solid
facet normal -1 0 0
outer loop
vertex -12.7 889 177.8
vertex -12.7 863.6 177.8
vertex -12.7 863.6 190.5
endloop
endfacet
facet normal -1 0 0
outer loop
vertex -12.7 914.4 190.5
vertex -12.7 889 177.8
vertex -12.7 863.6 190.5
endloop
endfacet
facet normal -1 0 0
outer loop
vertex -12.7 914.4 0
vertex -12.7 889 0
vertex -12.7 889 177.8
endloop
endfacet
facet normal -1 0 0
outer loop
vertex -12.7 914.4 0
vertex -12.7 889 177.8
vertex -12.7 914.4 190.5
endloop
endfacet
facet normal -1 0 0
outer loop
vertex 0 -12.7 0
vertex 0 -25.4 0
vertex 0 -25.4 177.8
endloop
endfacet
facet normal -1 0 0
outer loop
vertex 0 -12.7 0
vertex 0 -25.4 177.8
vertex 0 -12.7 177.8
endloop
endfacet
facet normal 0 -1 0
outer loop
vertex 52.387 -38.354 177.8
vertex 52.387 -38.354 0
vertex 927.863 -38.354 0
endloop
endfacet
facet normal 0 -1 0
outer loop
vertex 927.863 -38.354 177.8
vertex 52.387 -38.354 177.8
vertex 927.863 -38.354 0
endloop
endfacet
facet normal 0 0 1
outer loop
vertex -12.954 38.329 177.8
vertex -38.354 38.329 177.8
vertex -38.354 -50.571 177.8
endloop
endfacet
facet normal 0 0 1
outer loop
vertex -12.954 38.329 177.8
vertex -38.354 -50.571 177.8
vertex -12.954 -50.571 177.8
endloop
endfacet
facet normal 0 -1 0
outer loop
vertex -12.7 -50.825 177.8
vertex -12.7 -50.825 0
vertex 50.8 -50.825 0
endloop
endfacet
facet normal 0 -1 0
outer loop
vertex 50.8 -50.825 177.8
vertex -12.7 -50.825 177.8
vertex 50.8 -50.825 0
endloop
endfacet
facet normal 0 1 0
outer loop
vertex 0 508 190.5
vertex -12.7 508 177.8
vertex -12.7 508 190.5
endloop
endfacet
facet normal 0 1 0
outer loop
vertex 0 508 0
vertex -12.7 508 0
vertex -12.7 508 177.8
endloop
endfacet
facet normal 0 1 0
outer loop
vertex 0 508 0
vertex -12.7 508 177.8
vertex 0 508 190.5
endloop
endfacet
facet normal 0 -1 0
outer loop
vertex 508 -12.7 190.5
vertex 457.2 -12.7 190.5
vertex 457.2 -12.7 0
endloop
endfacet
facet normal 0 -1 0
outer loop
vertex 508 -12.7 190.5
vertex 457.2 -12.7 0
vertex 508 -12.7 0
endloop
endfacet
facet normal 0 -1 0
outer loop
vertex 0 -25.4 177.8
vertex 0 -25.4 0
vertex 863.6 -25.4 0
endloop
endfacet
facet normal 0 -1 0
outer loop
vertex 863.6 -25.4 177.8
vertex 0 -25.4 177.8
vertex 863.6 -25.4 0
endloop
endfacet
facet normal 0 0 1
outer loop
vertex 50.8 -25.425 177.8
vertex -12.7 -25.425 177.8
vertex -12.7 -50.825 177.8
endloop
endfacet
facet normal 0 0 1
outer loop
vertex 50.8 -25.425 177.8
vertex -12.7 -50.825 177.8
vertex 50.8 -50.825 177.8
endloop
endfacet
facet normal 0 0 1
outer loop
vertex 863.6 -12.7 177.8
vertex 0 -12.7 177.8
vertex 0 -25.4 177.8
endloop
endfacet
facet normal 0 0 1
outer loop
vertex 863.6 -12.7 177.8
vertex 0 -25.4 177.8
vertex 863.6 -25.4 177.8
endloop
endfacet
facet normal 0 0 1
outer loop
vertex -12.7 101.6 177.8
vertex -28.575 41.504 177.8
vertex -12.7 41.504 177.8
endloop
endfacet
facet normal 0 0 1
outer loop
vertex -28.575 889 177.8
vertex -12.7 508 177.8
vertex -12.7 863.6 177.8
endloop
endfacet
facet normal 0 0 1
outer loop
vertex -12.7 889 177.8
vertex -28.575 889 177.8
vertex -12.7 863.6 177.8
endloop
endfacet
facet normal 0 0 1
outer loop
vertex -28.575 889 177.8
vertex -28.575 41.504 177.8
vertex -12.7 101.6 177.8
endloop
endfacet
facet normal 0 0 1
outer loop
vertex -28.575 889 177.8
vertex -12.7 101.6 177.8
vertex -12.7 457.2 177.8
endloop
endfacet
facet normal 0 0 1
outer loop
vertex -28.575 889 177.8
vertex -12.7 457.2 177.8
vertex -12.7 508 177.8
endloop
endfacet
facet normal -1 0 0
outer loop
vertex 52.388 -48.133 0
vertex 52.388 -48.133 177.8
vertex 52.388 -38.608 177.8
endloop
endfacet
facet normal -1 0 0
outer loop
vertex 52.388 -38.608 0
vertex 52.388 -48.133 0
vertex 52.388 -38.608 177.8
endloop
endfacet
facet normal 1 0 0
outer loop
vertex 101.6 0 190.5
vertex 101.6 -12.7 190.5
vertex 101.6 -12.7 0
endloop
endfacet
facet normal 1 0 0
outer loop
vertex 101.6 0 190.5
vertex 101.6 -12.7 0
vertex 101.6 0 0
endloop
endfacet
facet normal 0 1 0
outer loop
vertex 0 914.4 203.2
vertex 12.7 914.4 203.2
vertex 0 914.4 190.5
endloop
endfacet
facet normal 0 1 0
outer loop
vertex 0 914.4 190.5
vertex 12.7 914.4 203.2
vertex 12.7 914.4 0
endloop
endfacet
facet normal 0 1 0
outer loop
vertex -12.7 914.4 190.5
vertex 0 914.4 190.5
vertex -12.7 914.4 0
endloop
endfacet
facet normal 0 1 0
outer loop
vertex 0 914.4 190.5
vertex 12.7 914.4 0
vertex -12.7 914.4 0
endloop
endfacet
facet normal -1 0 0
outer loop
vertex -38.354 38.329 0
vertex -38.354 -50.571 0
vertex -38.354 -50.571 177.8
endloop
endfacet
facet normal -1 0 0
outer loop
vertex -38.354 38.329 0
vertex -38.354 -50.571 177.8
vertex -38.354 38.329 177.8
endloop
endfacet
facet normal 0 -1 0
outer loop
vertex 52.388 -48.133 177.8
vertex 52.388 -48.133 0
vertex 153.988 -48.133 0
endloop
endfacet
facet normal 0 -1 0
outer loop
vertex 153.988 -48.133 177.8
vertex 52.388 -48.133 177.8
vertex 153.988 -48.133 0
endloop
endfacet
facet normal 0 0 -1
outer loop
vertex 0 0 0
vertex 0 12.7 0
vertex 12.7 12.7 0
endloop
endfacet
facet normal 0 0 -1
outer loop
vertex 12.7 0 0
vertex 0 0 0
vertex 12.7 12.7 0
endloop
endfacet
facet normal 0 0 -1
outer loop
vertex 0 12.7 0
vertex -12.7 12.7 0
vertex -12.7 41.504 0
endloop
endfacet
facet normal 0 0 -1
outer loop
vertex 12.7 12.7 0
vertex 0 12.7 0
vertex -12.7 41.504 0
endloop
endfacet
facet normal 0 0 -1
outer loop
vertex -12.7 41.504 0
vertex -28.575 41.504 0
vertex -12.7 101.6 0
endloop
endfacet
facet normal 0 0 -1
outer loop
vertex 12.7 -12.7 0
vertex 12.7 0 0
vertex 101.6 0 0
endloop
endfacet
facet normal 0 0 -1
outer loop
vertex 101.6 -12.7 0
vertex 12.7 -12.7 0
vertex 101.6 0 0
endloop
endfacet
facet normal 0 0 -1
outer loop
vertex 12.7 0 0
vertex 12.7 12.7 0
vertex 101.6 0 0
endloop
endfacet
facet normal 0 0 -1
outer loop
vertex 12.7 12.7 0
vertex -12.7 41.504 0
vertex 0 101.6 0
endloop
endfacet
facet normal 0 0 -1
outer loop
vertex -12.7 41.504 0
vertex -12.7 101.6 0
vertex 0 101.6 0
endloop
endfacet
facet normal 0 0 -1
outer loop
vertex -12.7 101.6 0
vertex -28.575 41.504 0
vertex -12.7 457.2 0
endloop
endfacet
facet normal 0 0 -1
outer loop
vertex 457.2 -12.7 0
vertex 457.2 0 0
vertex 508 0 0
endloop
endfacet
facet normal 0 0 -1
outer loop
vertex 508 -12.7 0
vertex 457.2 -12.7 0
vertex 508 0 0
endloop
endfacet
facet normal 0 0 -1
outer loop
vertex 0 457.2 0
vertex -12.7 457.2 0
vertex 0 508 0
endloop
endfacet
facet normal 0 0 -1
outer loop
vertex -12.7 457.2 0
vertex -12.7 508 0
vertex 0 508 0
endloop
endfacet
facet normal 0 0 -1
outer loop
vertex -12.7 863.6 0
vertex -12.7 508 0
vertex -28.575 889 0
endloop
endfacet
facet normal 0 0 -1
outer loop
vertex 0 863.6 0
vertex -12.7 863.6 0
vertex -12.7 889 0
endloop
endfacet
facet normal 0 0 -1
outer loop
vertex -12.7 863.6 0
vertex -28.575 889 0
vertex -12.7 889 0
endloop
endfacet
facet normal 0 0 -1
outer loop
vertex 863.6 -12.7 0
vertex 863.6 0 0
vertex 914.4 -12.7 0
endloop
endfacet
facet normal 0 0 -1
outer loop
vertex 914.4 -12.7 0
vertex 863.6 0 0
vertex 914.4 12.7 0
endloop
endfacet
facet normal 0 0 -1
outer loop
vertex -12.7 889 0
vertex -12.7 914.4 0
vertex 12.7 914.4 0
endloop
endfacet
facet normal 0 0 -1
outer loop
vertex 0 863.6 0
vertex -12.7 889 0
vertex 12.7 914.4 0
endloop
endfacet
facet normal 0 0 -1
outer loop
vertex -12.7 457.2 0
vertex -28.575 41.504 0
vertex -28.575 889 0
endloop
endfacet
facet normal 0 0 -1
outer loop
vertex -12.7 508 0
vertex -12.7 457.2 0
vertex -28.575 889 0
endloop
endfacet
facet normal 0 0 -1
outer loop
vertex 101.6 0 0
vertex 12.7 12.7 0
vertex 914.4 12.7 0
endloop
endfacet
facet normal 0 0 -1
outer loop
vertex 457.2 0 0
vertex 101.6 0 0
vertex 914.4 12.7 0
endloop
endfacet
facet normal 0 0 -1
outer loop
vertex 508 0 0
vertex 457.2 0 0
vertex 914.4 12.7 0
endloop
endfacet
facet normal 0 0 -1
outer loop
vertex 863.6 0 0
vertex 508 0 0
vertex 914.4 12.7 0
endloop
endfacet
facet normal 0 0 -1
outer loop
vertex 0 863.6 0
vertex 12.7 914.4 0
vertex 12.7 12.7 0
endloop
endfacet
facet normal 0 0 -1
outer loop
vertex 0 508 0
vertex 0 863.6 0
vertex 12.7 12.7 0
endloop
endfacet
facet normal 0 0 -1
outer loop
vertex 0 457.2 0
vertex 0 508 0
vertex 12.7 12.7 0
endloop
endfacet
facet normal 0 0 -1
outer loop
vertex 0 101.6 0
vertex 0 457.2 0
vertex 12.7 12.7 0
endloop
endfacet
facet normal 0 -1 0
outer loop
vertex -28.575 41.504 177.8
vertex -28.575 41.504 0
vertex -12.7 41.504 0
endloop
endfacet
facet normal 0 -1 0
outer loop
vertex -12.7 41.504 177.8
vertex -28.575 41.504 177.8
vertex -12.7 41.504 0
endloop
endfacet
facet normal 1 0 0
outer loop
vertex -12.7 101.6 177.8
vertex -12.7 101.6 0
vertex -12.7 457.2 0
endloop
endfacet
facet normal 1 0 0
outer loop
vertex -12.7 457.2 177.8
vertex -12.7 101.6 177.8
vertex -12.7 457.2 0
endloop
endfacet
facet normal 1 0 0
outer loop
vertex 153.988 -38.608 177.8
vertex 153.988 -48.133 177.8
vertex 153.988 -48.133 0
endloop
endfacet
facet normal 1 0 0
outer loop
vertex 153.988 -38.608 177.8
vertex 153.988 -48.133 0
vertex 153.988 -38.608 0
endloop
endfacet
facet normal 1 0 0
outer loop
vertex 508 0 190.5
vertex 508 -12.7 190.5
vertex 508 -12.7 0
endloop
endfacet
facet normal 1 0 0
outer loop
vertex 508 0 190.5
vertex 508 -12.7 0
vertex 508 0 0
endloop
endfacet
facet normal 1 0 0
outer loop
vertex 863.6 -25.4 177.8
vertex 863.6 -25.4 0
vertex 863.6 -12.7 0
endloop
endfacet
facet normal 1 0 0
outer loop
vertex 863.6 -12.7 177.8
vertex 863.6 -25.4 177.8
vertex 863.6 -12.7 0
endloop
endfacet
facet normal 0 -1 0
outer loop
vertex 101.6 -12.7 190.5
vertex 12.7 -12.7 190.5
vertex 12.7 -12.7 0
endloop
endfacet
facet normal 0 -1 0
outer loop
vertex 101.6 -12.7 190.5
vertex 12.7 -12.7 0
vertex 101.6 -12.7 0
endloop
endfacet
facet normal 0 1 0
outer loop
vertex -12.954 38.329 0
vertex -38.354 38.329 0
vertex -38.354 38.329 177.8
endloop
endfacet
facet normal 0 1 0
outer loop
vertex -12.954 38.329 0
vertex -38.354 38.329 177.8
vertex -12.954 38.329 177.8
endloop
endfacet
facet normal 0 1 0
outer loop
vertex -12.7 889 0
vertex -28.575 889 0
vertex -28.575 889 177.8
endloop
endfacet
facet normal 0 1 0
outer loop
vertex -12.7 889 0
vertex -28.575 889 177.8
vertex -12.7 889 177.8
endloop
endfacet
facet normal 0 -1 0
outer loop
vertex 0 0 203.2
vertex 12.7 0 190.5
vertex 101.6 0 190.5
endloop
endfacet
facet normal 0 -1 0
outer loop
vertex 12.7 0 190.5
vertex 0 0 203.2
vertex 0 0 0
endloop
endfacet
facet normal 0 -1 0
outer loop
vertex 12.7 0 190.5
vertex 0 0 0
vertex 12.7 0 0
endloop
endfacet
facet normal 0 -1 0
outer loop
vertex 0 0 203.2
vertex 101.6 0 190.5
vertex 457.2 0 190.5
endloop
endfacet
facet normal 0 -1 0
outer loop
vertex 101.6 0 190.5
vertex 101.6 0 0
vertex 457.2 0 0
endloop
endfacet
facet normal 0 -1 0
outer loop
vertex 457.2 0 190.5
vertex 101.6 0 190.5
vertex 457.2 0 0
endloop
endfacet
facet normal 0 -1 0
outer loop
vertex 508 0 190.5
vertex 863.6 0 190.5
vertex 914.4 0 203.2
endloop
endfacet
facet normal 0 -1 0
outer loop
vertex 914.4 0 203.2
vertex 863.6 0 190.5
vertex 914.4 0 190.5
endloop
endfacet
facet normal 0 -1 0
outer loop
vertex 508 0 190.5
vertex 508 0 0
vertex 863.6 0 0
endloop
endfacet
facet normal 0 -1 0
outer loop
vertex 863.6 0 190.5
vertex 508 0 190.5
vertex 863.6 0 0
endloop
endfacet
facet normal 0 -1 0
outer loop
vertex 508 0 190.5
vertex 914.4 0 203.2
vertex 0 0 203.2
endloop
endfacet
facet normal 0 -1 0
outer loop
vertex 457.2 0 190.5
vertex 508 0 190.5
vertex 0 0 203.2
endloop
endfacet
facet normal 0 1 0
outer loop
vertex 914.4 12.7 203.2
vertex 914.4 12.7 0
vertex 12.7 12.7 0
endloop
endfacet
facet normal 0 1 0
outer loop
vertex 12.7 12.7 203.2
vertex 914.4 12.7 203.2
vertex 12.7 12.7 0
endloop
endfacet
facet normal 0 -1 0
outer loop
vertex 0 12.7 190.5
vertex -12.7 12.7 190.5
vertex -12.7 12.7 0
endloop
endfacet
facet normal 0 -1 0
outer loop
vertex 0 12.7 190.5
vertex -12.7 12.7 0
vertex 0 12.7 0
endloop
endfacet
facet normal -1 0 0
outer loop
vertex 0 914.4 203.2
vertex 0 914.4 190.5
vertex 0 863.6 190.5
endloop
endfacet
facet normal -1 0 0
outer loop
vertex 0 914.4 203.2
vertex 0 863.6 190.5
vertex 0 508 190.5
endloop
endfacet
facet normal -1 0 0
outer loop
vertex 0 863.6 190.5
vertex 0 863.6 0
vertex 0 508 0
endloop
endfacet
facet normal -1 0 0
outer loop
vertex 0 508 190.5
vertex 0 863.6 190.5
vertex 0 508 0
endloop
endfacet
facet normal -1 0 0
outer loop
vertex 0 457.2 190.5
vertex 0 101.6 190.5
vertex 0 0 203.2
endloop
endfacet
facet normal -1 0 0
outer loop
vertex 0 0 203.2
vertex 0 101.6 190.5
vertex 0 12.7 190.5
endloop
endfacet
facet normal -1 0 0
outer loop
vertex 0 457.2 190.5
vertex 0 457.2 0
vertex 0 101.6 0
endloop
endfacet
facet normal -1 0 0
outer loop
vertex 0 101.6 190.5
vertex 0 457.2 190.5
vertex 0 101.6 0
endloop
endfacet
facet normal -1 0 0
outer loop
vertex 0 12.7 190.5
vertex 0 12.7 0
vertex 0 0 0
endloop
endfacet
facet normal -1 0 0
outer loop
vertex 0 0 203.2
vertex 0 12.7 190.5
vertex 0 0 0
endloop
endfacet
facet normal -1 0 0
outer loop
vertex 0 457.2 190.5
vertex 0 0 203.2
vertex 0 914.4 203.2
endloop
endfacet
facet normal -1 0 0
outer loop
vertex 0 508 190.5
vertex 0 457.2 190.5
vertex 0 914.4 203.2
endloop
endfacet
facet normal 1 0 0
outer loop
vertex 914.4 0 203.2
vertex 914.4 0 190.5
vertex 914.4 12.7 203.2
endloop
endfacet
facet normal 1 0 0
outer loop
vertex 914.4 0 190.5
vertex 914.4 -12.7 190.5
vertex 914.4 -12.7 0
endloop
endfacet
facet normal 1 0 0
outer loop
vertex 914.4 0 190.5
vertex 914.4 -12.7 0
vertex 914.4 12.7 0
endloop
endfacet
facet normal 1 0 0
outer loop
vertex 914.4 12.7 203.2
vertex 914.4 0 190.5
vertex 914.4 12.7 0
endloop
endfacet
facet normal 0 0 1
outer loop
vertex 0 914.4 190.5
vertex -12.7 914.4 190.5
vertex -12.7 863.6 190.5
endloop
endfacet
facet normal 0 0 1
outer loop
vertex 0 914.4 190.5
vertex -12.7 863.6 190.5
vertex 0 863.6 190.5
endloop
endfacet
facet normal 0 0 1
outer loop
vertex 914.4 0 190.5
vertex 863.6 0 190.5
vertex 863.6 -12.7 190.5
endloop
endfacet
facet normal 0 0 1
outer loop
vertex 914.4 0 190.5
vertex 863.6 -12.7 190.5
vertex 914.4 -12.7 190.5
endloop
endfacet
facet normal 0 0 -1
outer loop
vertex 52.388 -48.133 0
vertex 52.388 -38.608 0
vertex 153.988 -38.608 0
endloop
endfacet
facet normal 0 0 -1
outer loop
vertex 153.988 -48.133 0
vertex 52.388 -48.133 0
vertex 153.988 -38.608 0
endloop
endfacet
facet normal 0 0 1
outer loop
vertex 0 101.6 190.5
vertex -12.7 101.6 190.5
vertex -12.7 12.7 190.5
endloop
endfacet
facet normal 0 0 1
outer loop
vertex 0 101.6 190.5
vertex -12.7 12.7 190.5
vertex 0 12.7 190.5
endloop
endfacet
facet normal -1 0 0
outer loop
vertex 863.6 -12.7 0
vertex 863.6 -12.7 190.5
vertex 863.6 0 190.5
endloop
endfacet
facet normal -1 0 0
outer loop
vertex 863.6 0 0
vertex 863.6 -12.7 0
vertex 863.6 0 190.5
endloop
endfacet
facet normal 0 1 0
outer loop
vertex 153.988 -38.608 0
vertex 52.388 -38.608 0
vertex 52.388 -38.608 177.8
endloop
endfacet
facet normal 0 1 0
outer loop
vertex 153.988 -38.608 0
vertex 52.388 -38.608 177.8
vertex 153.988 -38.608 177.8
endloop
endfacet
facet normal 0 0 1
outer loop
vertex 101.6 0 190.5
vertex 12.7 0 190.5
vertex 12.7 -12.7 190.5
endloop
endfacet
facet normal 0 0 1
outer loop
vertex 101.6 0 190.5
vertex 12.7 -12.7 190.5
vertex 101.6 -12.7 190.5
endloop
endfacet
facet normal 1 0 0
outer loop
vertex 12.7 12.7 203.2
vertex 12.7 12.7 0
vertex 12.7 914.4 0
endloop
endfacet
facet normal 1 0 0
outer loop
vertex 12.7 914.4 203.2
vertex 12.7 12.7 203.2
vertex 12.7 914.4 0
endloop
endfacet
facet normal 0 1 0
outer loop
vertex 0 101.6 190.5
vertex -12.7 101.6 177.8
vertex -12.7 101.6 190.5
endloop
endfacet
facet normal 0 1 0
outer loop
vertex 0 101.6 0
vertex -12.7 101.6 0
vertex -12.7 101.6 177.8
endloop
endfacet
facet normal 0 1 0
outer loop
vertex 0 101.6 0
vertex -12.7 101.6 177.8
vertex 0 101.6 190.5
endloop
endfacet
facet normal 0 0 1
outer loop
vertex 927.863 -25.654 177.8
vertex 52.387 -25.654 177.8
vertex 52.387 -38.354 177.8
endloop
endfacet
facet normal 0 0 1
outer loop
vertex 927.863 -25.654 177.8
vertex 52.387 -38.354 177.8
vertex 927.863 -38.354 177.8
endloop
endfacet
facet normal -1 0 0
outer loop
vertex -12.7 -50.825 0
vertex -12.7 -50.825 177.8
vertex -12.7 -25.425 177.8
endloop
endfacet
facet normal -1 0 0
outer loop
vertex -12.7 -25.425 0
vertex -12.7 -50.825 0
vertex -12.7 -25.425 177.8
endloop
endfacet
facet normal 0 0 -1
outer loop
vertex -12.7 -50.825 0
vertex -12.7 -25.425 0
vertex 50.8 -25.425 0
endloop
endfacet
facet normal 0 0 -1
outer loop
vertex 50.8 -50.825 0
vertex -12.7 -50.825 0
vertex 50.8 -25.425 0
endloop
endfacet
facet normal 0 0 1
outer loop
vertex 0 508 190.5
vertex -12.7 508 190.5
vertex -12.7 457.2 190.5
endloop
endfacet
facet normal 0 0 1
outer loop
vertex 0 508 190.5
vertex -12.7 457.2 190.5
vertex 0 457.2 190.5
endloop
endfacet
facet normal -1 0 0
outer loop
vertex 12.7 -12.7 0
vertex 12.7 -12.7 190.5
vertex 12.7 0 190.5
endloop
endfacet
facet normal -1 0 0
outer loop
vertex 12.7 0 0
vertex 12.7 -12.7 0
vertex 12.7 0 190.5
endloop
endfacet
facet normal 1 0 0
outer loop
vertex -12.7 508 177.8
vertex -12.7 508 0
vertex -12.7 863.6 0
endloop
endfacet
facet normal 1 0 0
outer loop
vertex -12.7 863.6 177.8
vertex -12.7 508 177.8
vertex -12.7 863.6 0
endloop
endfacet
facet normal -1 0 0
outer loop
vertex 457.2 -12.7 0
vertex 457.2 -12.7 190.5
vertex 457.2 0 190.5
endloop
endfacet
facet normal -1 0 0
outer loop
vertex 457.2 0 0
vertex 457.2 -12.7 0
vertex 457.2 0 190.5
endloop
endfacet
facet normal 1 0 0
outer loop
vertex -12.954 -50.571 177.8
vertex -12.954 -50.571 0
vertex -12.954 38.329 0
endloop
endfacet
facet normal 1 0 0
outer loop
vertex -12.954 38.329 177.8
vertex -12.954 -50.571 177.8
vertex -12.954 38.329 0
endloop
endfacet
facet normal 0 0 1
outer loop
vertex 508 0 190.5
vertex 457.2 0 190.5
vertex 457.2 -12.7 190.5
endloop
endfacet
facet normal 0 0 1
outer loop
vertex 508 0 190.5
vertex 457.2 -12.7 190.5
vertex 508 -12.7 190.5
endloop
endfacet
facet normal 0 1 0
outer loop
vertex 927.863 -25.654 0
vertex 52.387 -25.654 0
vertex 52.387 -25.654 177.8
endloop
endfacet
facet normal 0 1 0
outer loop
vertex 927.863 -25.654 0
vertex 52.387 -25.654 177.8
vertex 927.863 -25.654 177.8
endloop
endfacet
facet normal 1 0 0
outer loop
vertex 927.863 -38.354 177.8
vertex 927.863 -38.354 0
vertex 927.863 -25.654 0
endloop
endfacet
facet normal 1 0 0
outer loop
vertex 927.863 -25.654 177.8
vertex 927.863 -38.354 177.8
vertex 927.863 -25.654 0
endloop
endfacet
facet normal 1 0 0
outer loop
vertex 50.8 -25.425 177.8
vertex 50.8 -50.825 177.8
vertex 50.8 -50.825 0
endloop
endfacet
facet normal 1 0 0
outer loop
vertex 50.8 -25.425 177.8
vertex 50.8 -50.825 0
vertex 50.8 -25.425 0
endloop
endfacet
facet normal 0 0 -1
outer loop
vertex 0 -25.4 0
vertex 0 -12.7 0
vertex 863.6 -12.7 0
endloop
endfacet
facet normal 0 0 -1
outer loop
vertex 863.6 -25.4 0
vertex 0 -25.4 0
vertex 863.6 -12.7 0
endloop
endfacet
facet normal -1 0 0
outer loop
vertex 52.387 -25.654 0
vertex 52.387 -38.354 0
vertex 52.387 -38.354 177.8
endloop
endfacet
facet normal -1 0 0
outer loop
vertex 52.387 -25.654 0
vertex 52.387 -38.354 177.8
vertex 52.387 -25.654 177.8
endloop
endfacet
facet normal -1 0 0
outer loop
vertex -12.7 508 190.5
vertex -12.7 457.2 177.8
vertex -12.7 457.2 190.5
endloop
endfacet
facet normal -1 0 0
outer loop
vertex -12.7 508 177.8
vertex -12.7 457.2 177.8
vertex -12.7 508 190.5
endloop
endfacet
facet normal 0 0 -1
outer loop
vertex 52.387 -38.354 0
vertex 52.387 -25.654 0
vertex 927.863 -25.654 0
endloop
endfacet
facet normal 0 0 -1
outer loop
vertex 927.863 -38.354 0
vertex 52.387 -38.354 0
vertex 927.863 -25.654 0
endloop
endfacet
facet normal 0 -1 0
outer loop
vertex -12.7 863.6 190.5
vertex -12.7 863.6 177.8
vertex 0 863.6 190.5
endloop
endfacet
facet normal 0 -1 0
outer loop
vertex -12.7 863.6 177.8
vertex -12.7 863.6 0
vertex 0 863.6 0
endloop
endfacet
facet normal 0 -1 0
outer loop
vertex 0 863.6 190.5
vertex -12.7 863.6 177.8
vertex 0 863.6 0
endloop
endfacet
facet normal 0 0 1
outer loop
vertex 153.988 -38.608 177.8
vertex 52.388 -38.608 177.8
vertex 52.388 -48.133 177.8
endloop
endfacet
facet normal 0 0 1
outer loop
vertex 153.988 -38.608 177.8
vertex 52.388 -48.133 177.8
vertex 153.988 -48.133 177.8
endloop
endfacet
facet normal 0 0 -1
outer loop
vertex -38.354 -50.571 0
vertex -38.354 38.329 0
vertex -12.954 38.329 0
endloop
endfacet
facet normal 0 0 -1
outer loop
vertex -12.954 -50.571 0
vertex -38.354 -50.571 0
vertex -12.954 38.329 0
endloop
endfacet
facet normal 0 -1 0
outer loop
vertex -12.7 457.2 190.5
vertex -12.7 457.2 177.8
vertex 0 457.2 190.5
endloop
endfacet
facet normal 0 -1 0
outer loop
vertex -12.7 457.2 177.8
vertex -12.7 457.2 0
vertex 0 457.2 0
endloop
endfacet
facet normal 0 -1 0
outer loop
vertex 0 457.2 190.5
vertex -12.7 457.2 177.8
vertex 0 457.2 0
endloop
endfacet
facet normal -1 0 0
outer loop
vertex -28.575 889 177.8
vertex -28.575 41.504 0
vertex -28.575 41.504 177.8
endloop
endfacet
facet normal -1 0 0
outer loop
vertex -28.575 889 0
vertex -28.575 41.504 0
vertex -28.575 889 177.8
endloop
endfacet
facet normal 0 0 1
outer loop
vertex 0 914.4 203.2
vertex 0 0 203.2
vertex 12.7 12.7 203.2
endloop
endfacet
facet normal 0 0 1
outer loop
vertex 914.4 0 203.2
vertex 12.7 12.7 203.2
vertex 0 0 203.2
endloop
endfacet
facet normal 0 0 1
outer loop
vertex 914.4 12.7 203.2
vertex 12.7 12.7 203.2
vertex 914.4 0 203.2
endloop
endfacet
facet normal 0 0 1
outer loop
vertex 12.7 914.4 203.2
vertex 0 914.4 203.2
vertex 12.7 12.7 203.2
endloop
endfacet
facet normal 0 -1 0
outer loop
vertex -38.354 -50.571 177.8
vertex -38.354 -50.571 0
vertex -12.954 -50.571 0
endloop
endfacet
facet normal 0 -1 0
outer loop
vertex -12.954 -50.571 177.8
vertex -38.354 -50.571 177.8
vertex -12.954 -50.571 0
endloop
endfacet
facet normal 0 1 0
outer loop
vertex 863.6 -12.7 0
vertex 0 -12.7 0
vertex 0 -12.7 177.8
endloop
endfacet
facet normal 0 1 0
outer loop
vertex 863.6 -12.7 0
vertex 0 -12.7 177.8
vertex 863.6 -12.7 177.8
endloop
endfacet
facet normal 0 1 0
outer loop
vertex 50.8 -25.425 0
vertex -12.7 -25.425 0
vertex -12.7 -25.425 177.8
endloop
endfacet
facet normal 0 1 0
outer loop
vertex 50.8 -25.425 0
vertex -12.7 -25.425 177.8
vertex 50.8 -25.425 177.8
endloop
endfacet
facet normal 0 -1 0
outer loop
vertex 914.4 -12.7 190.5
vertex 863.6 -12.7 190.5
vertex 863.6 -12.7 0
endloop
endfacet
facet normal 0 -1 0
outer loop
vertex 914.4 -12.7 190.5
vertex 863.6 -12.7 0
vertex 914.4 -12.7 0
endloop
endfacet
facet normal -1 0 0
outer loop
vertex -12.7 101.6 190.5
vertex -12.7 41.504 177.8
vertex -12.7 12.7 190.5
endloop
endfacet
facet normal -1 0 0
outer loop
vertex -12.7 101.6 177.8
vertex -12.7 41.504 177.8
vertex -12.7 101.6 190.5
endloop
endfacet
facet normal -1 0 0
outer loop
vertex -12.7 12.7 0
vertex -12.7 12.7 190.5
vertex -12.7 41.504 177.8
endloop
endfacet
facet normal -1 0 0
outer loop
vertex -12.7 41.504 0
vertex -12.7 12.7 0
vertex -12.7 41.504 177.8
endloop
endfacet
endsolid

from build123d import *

# Parameters (mm, degrees)
F1_DEPTH  = 203.2
F2_W      = 50.8
F2_H      = 12.7
F2_W_2    = 88.9
F2_W_3    = 12.7
F2_H_2    = 88.9
F2_H_3    = 50.8
F3_DEPTH  = 190.5
F4_W      = 25.4
F4_H      = 88.9
F4_W_2    = 63.5
F4_H_2    = 25.4
F5_DEPTH  = 177.8
F6_W      = 15.875
F6_H      = 847.4964
F7_DEPTH  = 177.8
F8_W      = 863.6
F8_H      = 12.7
F9_DEPTH  = 177.8
F10_W     = 875.475859
F10_H     = 12.7
F10_W_2   = 101.6
F10_H_2   = 9.525
F11_DEPTH = 177.8


with BuildPart() as f1:
    # F0 (on Top) → F1 (new body)
    with BuildSketch(Plane.XY):
        Polygon((0, 914.4), (0, 0), (914.4, 0), (914.4, 12.7), (12.7, 12.7), (12.7, 914.4), align=None)
    extrude(amount=F1_DEPTH)

    # F2 (on Top) → F3 (join)
    with BuildSketch(Plane.XY):
        with Locations((482.6, -6.35)):
            Rectangle(F2_W, F2_H)
        with Locations((889, -6.35)):
            Rectangle(F2_W, F2_H)
        with Locations((57.15, -6.35)):
            Rectangle(F2_W_2, F2_H)
        with Locations((-6.35, 57.15)):
            Rectangle(F2_W_3, F2_H_2)
        with Locations((-6.35, 482.6)):
            Rectangle(F2_W_3, F2_H_3)
        with Locations((-6.35, 889)):
            Rectangle(F2_W_3, F2_H_3)
    extrude(amount=F3_DEPTH)

    # F6 (on Top) → F7 (join)
    with BuildSketch(Plane.XY):
        with Locations((-20.6375, 465.2518)):
            Rectangle(F6_W, F6_H)
    extrude(amount=F7_DEPTH)


with BuildPart() as f5:
    # F4 (on Top) → F5 (new body)
    with BuildSketch(Plane.XY):
        with Locations((-25.654, -6.1214)):
            Rectangle(F4_W, F4_H)
        with Locations((19.05, -38.1254)):
            Rectangle(F4_W_2, F4_H_2)
    extrude(amount=F5_DEPTH)


with BuildPart() as f9:
    # F8 (on Top) → F9 (new body)
    with BuildSketch(Plane.XY):
        with Locations((431.8, -19.05)):
            Rectangle(F8_W, F8_H)
    extrude(amount=F9_DEPTH)


with BuildPart() as f11:
    # F10 (on Top) → F11 (new body)
    with BuildSketch(Plane.XY):
        with Locations((490.125429, -32.004)):
            Rectangle(F10_W, F10_H)
        with Locations((103.1875, -43.3705)):
            Rectangle(F10_W_2, F10_H_2)
    extrude(amount=F11_DEPTH)


solid = Compound([f1.part, f5.part, f9.part, f11.part])
